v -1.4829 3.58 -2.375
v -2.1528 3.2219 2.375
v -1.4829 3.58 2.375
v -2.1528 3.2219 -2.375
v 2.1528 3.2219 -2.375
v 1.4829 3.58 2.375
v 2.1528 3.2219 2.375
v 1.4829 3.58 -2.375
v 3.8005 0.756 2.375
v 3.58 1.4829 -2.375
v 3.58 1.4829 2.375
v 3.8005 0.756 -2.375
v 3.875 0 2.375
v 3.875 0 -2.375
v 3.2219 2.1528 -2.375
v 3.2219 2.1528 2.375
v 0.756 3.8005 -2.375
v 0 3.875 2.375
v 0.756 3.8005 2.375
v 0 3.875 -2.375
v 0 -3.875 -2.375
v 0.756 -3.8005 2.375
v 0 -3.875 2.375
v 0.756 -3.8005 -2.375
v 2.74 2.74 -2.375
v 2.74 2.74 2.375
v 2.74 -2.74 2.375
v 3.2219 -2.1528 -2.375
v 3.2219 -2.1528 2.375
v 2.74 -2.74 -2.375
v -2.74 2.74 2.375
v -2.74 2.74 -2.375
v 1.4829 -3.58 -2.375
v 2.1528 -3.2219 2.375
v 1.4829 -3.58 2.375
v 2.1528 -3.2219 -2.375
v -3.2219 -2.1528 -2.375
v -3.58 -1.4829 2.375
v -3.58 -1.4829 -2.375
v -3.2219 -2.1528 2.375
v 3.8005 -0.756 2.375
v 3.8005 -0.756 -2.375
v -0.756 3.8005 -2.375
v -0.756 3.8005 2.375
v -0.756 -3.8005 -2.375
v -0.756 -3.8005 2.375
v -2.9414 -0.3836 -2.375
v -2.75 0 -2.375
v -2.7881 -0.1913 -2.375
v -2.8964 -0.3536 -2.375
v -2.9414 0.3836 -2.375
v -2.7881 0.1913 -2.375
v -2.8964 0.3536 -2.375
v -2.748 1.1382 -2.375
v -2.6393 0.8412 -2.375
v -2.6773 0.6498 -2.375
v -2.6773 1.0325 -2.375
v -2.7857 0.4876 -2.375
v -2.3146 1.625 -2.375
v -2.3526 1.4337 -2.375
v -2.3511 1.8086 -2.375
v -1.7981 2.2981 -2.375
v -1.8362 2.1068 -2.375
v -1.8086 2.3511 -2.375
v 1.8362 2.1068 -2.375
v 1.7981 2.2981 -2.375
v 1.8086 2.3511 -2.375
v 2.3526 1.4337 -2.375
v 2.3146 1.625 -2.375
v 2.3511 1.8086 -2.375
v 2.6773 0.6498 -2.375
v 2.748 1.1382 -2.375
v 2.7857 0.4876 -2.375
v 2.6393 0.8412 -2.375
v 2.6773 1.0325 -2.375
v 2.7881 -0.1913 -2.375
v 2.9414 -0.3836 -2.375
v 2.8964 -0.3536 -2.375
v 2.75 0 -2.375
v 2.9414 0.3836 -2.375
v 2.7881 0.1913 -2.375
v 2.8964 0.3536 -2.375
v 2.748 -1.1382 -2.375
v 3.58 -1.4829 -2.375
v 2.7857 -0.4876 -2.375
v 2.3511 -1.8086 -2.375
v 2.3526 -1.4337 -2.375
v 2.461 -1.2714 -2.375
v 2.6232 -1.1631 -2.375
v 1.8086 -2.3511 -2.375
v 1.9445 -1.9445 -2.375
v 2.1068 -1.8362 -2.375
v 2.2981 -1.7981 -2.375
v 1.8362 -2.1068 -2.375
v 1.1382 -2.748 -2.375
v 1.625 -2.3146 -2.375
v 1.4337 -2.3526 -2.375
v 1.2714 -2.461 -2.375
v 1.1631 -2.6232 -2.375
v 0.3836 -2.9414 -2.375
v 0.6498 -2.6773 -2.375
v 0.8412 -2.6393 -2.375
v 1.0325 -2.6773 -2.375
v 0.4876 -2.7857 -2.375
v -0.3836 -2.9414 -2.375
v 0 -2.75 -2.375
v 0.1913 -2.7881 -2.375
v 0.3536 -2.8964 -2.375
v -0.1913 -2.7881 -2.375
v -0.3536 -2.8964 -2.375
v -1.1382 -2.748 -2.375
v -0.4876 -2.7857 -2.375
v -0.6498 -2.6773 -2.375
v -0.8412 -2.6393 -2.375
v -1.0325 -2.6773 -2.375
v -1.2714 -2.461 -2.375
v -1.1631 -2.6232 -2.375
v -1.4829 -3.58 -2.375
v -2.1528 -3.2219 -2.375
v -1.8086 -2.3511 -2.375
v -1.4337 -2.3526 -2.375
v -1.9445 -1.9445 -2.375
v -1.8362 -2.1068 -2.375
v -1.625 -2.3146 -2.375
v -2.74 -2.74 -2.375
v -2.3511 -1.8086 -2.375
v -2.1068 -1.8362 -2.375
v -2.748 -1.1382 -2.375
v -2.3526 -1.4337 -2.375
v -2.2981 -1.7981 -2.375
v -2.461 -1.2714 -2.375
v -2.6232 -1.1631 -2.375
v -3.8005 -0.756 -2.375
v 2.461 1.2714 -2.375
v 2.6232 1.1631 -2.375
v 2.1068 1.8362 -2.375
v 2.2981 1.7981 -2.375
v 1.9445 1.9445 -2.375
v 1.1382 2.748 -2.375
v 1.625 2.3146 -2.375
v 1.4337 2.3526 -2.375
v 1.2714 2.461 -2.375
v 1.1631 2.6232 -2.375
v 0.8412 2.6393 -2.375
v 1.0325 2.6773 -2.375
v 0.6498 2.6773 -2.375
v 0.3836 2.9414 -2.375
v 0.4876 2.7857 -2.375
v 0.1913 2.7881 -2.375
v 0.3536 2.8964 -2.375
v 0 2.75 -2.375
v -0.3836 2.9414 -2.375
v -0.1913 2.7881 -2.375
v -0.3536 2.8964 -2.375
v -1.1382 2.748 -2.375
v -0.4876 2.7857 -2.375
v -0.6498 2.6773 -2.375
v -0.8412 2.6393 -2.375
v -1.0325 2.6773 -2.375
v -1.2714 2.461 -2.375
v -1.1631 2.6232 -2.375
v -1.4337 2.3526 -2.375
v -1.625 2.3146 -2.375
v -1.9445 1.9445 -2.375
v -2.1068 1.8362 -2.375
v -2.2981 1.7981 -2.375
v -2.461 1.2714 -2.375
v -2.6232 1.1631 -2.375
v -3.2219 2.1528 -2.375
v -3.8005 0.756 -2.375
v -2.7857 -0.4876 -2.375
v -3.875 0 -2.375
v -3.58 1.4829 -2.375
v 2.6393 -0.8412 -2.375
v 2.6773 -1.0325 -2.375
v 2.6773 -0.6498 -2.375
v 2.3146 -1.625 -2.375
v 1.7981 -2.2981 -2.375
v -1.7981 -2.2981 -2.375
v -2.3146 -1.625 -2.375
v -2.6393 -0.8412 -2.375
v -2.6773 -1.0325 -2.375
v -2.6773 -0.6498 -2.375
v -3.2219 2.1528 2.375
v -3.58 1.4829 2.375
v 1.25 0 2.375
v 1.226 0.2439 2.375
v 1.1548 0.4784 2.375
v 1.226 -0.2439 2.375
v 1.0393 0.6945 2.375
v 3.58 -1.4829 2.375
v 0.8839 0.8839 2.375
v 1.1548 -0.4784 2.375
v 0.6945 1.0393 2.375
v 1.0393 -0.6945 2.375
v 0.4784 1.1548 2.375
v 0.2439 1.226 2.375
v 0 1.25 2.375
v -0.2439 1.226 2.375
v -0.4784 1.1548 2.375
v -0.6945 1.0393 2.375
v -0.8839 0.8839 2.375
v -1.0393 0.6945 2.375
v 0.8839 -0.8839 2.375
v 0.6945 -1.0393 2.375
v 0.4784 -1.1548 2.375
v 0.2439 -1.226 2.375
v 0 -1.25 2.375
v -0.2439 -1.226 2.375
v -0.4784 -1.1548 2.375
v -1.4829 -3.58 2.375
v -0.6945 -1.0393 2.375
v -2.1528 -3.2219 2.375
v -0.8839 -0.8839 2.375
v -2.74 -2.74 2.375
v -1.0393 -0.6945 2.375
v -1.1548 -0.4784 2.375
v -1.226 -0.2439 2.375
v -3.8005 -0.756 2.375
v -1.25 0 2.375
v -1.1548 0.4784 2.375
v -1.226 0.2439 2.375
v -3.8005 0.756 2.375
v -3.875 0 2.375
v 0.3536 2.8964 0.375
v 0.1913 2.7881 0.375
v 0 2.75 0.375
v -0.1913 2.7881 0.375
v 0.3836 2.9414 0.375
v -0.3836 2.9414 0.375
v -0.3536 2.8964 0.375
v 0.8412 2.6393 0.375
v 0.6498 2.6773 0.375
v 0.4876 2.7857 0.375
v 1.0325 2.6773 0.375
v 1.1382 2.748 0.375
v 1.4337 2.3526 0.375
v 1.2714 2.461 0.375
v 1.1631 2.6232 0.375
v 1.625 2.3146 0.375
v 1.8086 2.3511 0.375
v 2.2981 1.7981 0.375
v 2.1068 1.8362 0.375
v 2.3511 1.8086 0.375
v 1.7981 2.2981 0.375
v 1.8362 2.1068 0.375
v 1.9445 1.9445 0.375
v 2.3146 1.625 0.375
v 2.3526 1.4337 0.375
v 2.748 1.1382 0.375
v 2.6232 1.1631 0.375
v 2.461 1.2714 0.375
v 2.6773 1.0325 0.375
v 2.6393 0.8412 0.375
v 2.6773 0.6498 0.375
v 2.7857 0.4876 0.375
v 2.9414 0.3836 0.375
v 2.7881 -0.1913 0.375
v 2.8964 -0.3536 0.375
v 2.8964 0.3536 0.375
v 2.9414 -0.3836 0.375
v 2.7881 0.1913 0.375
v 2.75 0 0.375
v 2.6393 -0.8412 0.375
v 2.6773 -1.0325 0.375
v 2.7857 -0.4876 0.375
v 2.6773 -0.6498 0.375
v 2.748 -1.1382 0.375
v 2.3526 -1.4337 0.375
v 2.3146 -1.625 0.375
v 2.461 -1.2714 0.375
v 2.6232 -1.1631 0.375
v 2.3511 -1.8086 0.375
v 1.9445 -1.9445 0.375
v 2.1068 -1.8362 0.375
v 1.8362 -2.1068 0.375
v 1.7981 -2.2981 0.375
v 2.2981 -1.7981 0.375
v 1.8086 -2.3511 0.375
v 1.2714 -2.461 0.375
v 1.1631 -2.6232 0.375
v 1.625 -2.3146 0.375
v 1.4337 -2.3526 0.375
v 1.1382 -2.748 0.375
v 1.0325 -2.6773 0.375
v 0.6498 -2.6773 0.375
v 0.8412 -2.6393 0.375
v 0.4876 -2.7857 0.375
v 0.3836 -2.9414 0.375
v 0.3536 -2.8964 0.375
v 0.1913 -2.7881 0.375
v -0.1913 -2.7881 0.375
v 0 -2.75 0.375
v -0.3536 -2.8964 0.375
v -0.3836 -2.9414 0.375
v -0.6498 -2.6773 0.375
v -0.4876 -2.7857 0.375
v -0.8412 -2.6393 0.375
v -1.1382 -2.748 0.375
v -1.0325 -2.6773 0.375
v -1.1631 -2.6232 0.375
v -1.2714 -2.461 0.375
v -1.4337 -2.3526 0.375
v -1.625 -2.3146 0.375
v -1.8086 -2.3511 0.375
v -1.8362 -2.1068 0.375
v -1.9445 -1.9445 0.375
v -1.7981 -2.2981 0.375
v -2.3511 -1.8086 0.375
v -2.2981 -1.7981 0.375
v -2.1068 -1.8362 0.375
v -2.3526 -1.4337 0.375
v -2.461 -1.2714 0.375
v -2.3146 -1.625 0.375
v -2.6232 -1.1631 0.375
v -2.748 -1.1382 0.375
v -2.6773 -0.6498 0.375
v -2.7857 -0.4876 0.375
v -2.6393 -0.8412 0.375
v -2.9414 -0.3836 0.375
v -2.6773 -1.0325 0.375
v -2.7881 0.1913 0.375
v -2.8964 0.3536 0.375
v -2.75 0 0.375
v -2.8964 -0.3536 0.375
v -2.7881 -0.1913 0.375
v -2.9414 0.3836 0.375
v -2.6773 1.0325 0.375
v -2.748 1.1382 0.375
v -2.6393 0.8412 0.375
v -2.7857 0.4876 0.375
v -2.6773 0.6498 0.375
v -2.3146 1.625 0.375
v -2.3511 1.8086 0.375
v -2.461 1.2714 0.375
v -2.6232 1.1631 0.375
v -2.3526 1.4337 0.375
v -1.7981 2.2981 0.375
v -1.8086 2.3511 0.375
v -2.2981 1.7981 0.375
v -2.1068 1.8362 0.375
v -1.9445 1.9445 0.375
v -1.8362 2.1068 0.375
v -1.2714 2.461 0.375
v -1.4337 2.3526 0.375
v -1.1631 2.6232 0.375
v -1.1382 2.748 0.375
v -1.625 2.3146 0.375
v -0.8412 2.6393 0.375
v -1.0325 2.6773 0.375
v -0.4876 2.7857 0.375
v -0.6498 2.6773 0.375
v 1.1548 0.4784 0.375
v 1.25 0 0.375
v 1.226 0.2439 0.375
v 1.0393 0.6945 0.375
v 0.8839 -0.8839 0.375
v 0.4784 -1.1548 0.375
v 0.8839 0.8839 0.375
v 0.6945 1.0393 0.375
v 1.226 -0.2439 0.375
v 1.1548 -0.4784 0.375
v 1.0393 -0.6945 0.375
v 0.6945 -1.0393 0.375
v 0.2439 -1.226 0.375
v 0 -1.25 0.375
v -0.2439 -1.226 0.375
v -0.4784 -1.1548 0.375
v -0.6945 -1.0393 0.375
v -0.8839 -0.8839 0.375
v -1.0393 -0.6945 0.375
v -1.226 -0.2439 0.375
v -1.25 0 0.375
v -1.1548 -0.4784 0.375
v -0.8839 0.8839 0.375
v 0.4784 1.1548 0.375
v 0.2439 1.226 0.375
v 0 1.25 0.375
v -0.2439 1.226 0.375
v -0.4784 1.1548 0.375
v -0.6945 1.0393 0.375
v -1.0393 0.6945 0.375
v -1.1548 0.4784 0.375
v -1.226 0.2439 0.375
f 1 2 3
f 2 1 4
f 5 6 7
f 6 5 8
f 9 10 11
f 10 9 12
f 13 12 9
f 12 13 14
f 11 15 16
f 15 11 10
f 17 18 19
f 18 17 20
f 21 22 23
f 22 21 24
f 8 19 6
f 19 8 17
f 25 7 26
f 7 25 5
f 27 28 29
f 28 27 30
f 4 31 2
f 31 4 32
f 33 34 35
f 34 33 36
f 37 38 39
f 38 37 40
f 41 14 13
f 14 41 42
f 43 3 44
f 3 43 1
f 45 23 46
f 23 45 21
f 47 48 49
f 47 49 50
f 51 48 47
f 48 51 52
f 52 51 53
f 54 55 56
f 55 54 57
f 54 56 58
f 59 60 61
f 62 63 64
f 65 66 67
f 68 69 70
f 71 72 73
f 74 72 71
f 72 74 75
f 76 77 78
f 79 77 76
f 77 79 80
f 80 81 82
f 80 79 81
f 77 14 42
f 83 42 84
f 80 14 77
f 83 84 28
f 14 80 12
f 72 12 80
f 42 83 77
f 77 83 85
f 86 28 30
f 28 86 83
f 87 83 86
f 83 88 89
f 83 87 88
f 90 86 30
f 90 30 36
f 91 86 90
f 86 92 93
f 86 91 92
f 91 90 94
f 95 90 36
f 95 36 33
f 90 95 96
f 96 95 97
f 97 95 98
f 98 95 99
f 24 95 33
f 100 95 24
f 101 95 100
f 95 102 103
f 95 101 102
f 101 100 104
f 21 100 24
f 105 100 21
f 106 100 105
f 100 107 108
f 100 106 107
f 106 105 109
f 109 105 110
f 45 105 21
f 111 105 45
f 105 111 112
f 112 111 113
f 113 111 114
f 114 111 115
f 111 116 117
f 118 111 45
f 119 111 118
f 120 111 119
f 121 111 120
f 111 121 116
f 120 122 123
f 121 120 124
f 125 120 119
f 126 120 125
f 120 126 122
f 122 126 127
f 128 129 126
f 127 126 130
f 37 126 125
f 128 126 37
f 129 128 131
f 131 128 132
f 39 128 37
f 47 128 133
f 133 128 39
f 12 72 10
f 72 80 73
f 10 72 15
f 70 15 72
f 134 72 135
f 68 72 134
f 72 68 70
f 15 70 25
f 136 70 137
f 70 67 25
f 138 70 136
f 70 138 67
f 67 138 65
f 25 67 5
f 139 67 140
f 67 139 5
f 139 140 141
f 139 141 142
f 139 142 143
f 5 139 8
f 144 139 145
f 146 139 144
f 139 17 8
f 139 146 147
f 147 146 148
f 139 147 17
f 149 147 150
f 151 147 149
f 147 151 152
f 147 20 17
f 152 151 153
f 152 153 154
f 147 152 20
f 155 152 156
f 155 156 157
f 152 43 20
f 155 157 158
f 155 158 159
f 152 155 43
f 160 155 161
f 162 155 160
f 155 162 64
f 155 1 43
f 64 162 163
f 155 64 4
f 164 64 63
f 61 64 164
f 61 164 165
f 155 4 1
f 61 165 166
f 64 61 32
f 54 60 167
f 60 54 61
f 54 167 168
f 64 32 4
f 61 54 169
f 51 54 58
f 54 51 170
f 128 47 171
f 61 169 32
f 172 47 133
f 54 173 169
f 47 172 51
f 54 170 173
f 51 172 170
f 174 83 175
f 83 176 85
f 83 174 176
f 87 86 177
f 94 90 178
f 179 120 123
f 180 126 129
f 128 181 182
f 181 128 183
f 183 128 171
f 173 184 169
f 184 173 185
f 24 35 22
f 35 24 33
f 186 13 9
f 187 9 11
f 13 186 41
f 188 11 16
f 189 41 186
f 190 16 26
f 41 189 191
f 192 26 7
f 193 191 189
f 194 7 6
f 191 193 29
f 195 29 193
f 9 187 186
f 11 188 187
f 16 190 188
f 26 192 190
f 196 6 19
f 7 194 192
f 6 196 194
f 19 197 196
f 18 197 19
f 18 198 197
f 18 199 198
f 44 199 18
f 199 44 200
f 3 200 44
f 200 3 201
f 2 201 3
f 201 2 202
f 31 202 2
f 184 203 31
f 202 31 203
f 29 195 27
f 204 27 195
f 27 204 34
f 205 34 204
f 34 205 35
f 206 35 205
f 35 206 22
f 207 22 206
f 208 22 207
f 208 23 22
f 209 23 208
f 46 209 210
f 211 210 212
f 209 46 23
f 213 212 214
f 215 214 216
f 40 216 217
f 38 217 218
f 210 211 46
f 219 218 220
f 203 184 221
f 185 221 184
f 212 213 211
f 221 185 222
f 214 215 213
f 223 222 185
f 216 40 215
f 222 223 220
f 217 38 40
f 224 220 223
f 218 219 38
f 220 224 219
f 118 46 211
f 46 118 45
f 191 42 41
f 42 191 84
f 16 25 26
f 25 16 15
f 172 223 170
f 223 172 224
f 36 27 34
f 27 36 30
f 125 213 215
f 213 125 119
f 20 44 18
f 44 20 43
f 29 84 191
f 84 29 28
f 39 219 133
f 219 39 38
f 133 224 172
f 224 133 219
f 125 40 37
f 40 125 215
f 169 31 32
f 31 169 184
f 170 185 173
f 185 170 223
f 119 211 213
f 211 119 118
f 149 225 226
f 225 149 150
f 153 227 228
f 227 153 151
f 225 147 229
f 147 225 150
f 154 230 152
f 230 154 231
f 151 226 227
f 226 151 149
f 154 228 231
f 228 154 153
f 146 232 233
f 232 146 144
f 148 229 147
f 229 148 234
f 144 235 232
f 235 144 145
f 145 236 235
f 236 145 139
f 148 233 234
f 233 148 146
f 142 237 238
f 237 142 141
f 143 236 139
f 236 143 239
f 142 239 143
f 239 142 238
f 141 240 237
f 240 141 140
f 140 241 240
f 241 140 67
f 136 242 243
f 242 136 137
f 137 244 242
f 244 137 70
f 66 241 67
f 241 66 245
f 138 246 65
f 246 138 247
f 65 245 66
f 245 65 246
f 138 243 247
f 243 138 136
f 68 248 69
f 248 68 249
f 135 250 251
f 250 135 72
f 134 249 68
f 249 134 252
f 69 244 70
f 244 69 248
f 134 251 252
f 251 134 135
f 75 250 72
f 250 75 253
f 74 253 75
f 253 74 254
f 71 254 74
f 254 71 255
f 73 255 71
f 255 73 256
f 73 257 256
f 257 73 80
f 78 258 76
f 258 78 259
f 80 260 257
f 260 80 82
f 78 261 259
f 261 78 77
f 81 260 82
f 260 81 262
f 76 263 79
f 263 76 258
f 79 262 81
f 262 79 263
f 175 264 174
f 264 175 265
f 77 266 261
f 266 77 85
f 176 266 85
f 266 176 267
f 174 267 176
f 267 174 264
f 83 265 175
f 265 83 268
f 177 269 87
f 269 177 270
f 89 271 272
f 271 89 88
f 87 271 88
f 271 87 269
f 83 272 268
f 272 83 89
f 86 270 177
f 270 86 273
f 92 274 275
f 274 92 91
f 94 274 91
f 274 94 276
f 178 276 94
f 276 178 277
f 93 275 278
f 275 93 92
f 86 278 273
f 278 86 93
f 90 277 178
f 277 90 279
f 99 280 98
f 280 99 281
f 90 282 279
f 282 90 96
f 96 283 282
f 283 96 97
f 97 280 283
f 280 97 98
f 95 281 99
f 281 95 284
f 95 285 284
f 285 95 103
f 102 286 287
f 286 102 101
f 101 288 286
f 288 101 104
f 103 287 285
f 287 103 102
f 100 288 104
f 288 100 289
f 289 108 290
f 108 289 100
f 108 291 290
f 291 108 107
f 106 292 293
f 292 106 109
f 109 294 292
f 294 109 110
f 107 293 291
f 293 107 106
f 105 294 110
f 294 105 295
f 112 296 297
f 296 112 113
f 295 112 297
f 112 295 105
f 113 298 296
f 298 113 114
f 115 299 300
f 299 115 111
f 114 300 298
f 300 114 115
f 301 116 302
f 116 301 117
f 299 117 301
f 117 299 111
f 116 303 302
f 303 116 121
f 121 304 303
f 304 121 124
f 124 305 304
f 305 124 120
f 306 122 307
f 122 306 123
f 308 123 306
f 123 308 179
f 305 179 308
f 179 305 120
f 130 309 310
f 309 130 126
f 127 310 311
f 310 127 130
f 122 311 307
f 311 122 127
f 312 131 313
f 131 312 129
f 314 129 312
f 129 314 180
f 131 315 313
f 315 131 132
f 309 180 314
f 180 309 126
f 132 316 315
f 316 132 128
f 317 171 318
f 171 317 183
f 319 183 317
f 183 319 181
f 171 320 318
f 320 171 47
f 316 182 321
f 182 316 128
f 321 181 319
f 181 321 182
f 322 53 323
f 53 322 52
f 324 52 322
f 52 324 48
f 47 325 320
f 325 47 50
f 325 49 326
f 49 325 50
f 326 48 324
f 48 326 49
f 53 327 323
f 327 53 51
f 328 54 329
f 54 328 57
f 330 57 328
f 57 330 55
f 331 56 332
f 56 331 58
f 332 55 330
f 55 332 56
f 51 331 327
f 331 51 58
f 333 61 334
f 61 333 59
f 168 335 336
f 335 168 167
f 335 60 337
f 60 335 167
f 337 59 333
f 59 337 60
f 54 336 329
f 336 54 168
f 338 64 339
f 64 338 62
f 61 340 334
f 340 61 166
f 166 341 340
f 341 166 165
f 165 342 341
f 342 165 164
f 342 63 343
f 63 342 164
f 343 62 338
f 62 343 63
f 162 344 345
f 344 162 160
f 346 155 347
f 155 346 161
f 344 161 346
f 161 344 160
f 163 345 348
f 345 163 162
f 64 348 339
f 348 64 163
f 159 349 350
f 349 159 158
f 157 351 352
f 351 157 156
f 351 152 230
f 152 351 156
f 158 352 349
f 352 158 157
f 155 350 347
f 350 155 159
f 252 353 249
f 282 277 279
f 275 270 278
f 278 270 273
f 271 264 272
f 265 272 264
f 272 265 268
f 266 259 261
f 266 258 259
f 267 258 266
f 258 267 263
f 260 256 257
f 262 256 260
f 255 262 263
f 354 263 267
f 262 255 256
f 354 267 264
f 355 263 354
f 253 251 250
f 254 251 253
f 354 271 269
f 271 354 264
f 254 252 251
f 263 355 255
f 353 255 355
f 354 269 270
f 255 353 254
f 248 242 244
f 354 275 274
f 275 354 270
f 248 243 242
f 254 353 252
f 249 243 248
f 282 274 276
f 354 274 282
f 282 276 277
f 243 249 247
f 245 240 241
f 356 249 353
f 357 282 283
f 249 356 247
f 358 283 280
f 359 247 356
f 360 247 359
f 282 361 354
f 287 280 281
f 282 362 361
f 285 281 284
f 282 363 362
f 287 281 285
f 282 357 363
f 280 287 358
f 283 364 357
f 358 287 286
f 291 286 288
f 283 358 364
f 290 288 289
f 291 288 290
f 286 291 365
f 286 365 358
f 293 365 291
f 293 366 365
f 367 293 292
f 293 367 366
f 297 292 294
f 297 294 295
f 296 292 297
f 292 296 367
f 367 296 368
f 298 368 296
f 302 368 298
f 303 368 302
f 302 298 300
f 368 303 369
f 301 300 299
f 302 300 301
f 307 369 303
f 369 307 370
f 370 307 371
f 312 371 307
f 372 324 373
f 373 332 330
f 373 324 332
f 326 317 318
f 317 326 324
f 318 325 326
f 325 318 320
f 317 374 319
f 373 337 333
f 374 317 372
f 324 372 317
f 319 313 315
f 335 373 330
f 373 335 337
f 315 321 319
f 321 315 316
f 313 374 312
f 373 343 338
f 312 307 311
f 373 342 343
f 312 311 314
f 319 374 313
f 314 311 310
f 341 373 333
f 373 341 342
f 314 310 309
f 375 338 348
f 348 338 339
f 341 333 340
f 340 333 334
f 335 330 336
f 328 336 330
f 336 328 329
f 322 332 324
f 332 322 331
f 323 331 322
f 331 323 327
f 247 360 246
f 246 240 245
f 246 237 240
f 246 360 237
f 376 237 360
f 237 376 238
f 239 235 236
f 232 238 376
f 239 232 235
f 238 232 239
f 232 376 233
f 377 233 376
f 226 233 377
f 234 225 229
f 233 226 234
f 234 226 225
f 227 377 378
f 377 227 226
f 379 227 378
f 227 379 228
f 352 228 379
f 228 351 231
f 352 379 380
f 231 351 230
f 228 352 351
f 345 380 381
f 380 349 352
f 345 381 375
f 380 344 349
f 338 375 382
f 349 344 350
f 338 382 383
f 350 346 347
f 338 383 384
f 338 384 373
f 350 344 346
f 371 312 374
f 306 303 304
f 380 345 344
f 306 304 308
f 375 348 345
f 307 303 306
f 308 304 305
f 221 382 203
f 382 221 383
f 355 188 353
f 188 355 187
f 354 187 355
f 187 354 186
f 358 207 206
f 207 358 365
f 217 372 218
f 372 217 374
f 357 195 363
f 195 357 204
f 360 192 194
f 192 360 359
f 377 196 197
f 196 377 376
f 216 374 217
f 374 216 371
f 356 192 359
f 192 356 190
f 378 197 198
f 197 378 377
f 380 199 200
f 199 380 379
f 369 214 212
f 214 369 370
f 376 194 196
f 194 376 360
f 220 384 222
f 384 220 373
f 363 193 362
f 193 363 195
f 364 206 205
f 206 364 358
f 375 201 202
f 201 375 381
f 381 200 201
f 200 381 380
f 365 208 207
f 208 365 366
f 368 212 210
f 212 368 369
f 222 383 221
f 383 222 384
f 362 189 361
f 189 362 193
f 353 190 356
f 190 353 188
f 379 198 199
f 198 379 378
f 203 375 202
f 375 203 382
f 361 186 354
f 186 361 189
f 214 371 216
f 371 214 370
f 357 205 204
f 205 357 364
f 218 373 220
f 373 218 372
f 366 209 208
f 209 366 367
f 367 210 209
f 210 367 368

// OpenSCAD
num_ripples = 24;
md = 6.50;
height = 4.75;
ripple_d = 1.0;
ripple_bottom = 2;

outer_r = 7.75 / 2;
inner_r = 6.5 / 2;

difference()
{
	cylinder(h = height, r = outer_r, center = true, $fn = 32);
    cylinder(h = height+.1, r = inner_r, center = true, $fn = 32);
}
ripples();
translate([0,0, (height / 2) - (ripple_bottom/2)])
	difference()
	{
		cylinder(h = ripple_bottom, r = 7.25 / 2, center = true, $fn = 32);
    		cylinder(h = ripple_bottom + .1, r = 2.50 / 2, center = true, $fn = 32);
	}

module arm()
{
	


}

module ripples()
{
	for (i = [0:num_ripples]) 
        assign(deg = (360 / num_ripples) * i)
		{
			translate( [(md / 2) * sin(deg), (md / 2) * cos(deg), 0] ) 
				cylinder(h = height, r1 = ripple_d / 2, r2 = ripple_d / 2, center = true, $fn=16);
		}
}
